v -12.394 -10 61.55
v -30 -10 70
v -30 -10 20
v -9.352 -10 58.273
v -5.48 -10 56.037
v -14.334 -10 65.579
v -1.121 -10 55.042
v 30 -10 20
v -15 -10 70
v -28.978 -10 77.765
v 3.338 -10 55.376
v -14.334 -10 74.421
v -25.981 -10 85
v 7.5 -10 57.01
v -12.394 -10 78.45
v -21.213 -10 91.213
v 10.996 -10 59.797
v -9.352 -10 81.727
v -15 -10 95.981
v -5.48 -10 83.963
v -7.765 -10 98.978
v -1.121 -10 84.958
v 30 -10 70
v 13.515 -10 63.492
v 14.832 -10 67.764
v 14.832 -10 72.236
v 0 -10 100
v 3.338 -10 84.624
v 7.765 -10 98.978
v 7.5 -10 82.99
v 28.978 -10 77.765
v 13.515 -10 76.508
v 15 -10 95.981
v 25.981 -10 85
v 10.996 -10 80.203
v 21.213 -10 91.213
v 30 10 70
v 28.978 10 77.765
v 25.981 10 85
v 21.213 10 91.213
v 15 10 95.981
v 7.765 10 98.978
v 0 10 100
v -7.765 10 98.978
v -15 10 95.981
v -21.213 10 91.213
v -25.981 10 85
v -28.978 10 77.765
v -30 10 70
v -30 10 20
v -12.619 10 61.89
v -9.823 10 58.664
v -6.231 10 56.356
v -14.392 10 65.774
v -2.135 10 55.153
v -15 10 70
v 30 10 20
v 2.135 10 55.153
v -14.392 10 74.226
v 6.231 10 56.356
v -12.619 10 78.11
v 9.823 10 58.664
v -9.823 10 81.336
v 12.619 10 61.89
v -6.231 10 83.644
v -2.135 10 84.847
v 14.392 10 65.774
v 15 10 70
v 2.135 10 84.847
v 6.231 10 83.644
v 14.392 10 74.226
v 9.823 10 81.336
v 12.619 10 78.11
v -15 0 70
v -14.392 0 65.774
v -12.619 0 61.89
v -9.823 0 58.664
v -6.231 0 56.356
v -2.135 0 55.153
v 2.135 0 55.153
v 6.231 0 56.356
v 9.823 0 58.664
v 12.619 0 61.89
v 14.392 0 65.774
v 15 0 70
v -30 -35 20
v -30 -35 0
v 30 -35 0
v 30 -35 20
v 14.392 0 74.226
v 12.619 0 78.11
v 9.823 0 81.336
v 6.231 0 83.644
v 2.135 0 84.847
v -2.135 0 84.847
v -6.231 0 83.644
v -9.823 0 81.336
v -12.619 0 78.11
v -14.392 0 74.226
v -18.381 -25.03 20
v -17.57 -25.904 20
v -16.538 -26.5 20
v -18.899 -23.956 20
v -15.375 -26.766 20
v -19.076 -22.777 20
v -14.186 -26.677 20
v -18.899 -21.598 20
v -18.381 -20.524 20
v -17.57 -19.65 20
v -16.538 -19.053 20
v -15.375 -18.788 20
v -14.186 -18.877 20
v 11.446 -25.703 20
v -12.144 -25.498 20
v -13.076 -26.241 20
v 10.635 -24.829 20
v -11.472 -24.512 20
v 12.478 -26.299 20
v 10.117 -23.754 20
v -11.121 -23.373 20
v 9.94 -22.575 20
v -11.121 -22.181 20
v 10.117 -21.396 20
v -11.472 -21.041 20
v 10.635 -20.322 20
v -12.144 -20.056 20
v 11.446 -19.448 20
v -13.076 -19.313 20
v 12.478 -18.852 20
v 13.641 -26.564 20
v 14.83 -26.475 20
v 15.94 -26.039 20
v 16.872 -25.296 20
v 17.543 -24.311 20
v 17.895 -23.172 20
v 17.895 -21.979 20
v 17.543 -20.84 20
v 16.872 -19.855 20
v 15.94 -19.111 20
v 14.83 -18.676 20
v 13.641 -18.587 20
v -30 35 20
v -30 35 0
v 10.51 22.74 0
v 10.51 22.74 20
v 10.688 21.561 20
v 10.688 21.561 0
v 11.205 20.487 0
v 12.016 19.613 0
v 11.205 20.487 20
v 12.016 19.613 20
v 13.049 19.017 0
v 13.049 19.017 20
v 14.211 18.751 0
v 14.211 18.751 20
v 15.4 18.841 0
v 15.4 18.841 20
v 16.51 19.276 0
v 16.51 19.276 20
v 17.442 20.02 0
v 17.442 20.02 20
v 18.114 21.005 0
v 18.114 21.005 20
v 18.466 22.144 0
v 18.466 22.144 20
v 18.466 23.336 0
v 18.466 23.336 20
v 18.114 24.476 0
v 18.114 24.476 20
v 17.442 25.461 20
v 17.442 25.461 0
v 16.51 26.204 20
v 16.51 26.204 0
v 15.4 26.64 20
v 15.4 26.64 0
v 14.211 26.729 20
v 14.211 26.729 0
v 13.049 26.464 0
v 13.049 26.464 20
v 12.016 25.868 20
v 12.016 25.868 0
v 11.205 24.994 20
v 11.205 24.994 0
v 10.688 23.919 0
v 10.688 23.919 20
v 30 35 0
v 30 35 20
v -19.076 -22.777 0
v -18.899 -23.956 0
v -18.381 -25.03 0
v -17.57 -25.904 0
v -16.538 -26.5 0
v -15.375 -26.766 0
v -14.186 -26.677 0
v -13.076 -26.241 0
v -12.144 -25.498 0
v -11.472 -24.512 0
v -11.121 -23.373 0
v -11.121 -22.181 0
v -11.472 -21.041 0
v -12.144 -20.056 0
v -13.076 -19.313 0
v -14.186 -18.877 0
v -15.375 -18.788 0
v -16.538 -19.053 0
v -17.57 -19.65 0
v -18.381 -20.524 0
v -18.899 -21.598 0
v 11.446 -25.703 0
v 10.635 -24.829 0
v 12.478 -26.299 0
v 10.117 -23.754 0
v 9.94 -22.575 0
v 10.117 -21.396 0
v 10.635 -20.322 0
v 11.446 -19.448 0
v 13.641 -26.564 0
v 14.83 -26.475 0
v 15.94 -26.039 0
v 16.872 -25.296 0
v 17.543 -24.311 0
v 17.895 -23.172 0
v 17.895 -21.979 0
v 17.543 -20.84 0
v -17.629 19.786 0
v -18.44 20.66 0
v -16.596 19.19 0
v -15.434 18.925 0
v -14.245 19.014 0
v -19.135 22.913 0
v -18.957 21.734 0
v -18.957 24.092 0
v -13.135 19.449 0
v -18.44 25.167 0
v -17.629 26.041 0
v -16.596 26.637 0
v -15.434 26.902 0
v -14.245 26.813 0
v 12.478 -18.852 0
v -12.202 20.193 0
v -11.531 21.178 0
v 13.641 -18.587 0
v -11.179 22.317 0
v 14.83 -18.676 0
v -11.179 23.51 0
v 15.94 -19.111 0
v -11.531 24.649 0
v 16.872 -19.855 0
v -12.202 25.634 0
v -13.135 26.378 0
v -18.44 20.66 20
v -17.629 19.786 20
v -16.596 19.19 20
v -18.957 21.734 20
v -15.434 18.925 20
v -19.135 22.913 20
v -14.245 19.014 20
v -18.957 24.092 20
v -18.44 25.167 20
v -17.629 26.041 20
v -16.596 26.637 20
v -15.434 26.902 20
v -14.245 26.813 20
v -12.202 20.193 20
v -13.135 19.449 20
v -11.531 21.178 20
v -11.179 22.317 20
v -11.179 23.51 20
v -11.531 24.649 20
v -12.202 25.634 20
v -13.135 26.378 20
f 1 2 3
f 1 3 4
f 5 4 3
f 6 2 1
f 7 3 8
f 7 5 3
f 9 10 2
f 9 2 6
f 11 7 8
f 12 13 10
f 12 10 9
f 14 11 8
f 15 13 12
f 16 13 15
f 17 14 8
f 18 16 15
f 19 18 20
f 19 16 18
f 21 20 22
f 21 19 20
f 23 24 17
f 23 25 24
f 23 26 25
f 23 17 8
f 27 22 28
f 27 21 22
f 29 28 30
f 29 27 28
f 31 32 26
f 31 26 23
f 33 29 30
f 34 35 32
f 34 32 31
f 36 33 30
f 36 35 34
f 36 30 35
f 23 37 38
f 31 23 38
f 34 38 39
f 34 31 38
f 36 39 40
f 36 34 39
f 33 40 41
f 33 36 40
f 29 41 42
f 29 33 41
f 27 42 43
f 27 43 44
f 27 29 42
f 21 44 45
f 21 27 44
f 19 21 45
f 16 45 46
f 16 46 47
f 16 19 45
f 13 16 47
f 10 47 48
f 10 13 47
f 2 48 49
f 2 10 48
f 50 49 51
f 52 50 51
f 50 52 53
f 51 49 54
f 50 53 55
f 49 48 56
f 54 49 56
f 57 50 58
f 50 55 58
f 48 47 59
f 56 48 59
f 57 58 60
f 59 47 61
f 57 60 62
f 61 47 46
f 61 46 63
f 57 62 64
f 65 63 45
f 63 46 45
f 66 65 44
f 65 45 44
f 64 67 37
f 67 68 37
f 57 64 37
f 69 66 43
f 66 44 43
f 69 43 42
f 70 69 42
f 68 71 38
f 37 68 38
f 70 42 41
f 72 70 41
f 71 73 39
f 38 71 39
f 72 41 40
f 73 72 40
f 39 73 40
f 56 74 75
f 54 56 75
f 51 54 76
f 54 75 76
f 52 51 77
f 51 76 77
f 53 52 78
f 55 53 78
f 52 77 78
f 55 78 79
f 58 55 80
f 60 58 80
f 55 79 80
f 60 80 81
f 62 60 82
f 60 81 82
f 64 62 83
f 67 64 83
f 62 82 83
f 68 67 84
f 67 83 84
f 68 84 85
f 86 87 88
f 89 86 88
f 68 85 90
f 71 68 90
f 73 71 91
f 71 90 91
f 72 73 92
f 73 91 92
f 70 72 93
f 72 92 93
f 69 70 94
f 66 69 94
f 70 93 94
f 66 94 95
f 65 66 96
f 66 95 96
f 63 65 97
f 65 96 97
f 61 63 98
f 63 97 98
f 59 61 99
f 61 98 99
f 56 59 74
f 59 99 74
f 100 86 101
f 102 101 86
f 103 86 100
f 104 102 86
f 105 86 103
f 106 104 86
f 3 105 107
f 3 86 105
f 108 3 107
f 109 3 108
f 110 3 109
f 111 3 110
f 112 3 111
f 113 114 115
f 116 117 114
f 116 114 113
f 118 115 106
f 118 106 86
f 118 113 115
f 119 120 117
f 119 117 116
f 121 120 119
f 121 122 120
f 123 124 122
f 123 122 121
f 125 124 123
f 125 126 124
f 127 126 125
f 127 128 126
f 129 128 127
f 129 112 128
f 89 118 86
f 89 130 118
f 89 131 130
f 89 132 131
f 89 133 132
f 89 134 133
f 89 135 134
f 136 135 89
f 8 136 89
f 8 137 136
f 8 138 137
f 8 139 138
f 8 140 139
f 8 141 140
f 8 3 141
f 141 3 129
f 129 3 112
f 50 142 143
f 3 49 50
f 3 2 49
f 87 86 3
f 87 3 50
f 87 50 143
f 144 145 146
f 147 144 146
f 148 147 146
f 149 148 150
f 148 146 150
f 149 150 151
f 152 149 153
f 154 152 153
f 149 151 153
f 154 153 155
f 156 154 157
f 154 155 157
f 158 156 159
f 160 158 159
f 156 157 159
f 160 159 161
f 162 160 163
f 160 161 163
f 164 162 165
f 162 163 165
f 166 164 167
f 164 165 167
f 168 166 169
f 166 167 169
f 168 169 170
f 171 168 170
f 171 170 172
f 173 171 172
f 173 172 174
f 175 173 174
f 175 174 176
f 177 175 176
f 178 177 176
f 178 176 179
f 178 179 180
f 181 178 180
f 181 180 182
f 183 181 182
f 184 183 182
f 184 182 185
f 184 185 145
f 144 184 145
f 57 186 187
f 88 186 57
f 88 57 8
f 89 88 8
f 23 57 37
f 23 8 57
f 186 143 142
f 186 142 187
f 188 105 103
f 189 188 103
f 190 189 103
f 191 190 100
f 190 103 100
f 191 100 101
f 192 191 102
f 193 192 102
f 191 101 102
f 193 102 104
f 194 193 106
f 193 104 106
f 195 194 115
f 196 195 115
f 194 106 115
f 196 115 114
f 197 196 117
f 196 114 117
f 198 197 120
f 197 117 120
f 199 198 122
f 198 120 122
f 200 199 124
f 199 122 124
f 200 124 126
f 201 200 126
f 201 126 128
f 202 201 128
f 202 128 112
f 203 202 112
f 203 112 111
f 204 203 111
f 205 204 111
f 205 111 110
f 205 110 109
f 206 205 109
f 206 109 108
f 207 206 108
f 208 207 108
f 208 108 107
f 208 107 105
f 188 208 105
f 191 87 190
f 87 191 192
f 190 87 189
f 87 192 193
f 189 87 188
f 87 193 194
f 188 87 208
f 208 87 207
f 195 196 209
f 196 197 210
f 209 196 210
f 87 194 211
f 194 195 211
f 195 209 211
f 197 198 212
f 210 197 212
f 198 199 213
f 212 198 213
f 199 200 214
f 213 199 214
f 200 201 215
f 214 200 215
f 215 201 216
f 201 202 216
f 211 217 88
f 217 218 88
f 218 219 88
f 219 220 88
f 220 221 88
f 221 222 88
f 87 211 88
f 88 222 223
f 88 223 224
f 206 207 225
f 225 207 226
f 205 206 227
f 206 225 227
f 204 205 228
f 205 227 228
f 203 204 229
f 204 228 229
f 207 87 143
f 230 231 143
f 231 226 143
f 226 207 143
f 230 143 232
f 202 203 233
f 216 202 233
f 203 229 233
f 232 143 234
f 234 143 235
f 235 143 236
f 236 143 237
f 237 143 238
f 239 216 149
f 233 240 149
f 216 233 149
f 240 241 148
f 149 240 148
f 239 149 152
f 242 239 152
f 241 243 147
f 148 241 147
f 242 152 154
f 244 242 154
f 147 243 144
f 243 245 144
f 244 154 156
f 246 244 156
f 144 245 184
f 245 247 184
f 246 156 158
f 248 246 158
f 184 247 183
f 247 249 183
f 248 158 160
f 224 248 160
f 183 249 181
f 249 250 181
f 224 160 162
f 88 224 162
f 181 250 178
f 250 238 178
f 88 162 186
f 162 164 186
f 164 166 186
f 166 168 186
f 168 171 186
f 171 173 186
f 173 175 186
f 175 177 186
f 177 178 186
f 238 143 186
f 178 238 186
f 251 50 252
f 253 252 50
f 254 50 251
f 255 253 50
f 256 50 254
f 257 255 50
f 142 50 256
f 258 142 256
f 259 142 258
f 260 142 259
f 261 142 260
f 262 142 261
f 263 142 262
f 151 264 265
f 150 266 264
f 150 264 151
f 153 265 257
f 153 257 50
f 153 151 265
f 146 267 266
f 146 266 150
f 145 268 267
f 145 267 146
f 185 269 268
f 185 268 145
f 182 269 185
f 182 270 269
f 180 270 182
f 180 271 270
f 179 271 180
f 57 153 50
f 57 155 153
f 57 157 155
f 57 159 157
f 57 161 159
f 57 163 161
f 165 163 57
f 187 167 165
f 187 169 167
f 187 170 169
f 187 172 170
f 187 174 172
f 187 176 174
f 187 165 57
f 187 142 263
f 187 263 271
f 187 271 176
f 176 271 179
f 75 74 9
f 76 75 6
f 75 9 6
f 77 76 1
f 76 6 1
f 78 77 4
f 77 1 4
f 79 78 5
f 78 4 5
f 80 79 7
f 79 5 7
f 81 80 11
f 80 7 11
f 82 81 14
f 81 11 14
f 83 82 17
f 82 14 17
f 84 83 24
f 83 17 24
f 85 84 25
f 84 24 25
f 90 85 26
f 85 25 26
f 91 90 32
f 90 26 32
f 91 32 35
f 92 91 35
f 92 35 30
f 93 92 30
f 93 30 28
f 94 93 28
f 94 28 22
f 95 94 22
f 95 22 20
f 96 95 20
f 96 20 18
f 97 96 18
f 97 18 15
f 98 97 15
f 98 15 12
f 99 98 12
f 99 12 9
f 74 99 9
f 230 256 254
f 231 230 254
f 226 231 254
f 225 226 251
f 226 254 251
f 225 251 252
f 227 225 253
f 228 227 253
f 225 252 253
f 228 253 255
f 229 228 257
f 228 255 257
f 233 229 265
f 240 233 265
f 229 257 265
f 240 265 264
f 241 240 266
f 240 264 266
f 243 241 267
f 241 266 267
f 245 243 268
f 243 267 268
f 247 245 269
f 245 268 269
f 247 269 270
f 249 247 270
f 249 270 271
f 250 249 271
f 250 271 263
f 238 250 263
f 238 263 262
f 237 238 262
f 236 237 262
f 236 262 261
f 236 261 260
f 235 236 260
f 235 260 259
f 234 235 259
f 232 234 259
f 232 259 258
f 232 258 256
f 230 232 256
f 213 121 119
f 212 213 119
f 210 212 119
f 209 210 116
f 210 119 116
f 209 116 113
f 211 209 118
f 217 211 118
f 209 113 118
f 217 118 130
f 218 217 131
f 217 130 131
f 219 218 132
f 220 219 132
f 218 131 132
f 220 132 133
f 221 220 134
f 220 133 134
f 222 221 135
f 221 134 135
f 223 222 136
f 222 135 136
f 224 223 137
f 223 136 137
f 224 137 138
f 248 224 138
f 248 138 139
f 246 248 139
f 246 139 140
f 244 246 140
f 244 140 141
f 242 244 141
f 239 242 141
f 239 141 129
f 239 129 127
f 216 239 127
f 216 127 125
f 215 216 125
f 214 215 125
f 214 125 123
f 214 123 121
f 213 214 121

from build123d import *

# Parameters (mm, degrees)
F0_W          = 60
F0_H          = 70
F1_DEPTH      = 20
F3_DEPTH      = 10
F3_DEPTH_BACK = 10
F4_D          = 30
F4_DEPTH      = 35.001
F5_D          = 30
F7_D          = 8
F9_D          = 8
F11_D         = 8
F13_D         = 8


with BuildPart() as f1:
    # F0 (on Top) → F1 (new body)
    with BuildSketch(Plane.XY):
        Rectangle(F0_W, F0_H)
    extrude(amount=F1_DEPTH)

    # F2 (on Front) → F3 (join, two sides)
    with BuildSketch(Plane.XZ) as f3_sk:
        with BuildLine():
            Line((-30, 70), (-30, 20))
            Line((-30, 20), (30, 20))
            Line((30, 20), (30, 70))
            ThreePointArc((30, 70), (0, 100), (-30, 70))
        make_face()
    extrude(amount=F3_DEPTH)
    extrude(f3_sk.sketch, amount=-F3_DEPTH_BACK)

    # F4 (through all, one way)
    with BuildSketch(Plane.XZ):
        with Locations((0, 70)):
            Circle(F4_D / 2)
    extrude(amount=-F4_DEPTH, mode=Mode.SUBTRACT)

    # F5 (through all)
    with Locations(Plane(origin=(0, 0, 0), x_dir=(1, 0, 0), z_dir=(0, 1, 0))):
        with Locations((0, -70)):
            Hole(F5_D / 2)

    # F7 (through all)
    with Locations(Plane(origin=(0, 0, 0), x_dir=(1, 0, 0), z_dir=(0, 0, -1))):
        with Locations((-15.0762257692, 22.7768636146)):
            Hole(F7_D / 2)

    # F9 (through all)
    with Locations(Plane(origin=(0, 0, 0), x_dir=(1, 0, 0), z_dir=(0, 0, -1))):
        with Locations((13.9395821379, 22.5753379162)):
            Hole(F9_D / 2)

    # F11 (through all)
    with Locations(Plane(origin=(0, 0, 0), x_dir=(1, 0, 0), z_dir=(0, 0, -1))):
        with Locations((14.5101989083, -22.7402444433)):
            Hole(F11_D / 2)

    # F13 (through all)
    with Locations(Plane(origin=(0, 0, 0), x_dir=(1, 0, 0), z_dir=(0, 0, -1))):
        with Locations((-15.1346469246, -22.9134526099)):
            Hole(F13_D / 2)


solid = f1.part
